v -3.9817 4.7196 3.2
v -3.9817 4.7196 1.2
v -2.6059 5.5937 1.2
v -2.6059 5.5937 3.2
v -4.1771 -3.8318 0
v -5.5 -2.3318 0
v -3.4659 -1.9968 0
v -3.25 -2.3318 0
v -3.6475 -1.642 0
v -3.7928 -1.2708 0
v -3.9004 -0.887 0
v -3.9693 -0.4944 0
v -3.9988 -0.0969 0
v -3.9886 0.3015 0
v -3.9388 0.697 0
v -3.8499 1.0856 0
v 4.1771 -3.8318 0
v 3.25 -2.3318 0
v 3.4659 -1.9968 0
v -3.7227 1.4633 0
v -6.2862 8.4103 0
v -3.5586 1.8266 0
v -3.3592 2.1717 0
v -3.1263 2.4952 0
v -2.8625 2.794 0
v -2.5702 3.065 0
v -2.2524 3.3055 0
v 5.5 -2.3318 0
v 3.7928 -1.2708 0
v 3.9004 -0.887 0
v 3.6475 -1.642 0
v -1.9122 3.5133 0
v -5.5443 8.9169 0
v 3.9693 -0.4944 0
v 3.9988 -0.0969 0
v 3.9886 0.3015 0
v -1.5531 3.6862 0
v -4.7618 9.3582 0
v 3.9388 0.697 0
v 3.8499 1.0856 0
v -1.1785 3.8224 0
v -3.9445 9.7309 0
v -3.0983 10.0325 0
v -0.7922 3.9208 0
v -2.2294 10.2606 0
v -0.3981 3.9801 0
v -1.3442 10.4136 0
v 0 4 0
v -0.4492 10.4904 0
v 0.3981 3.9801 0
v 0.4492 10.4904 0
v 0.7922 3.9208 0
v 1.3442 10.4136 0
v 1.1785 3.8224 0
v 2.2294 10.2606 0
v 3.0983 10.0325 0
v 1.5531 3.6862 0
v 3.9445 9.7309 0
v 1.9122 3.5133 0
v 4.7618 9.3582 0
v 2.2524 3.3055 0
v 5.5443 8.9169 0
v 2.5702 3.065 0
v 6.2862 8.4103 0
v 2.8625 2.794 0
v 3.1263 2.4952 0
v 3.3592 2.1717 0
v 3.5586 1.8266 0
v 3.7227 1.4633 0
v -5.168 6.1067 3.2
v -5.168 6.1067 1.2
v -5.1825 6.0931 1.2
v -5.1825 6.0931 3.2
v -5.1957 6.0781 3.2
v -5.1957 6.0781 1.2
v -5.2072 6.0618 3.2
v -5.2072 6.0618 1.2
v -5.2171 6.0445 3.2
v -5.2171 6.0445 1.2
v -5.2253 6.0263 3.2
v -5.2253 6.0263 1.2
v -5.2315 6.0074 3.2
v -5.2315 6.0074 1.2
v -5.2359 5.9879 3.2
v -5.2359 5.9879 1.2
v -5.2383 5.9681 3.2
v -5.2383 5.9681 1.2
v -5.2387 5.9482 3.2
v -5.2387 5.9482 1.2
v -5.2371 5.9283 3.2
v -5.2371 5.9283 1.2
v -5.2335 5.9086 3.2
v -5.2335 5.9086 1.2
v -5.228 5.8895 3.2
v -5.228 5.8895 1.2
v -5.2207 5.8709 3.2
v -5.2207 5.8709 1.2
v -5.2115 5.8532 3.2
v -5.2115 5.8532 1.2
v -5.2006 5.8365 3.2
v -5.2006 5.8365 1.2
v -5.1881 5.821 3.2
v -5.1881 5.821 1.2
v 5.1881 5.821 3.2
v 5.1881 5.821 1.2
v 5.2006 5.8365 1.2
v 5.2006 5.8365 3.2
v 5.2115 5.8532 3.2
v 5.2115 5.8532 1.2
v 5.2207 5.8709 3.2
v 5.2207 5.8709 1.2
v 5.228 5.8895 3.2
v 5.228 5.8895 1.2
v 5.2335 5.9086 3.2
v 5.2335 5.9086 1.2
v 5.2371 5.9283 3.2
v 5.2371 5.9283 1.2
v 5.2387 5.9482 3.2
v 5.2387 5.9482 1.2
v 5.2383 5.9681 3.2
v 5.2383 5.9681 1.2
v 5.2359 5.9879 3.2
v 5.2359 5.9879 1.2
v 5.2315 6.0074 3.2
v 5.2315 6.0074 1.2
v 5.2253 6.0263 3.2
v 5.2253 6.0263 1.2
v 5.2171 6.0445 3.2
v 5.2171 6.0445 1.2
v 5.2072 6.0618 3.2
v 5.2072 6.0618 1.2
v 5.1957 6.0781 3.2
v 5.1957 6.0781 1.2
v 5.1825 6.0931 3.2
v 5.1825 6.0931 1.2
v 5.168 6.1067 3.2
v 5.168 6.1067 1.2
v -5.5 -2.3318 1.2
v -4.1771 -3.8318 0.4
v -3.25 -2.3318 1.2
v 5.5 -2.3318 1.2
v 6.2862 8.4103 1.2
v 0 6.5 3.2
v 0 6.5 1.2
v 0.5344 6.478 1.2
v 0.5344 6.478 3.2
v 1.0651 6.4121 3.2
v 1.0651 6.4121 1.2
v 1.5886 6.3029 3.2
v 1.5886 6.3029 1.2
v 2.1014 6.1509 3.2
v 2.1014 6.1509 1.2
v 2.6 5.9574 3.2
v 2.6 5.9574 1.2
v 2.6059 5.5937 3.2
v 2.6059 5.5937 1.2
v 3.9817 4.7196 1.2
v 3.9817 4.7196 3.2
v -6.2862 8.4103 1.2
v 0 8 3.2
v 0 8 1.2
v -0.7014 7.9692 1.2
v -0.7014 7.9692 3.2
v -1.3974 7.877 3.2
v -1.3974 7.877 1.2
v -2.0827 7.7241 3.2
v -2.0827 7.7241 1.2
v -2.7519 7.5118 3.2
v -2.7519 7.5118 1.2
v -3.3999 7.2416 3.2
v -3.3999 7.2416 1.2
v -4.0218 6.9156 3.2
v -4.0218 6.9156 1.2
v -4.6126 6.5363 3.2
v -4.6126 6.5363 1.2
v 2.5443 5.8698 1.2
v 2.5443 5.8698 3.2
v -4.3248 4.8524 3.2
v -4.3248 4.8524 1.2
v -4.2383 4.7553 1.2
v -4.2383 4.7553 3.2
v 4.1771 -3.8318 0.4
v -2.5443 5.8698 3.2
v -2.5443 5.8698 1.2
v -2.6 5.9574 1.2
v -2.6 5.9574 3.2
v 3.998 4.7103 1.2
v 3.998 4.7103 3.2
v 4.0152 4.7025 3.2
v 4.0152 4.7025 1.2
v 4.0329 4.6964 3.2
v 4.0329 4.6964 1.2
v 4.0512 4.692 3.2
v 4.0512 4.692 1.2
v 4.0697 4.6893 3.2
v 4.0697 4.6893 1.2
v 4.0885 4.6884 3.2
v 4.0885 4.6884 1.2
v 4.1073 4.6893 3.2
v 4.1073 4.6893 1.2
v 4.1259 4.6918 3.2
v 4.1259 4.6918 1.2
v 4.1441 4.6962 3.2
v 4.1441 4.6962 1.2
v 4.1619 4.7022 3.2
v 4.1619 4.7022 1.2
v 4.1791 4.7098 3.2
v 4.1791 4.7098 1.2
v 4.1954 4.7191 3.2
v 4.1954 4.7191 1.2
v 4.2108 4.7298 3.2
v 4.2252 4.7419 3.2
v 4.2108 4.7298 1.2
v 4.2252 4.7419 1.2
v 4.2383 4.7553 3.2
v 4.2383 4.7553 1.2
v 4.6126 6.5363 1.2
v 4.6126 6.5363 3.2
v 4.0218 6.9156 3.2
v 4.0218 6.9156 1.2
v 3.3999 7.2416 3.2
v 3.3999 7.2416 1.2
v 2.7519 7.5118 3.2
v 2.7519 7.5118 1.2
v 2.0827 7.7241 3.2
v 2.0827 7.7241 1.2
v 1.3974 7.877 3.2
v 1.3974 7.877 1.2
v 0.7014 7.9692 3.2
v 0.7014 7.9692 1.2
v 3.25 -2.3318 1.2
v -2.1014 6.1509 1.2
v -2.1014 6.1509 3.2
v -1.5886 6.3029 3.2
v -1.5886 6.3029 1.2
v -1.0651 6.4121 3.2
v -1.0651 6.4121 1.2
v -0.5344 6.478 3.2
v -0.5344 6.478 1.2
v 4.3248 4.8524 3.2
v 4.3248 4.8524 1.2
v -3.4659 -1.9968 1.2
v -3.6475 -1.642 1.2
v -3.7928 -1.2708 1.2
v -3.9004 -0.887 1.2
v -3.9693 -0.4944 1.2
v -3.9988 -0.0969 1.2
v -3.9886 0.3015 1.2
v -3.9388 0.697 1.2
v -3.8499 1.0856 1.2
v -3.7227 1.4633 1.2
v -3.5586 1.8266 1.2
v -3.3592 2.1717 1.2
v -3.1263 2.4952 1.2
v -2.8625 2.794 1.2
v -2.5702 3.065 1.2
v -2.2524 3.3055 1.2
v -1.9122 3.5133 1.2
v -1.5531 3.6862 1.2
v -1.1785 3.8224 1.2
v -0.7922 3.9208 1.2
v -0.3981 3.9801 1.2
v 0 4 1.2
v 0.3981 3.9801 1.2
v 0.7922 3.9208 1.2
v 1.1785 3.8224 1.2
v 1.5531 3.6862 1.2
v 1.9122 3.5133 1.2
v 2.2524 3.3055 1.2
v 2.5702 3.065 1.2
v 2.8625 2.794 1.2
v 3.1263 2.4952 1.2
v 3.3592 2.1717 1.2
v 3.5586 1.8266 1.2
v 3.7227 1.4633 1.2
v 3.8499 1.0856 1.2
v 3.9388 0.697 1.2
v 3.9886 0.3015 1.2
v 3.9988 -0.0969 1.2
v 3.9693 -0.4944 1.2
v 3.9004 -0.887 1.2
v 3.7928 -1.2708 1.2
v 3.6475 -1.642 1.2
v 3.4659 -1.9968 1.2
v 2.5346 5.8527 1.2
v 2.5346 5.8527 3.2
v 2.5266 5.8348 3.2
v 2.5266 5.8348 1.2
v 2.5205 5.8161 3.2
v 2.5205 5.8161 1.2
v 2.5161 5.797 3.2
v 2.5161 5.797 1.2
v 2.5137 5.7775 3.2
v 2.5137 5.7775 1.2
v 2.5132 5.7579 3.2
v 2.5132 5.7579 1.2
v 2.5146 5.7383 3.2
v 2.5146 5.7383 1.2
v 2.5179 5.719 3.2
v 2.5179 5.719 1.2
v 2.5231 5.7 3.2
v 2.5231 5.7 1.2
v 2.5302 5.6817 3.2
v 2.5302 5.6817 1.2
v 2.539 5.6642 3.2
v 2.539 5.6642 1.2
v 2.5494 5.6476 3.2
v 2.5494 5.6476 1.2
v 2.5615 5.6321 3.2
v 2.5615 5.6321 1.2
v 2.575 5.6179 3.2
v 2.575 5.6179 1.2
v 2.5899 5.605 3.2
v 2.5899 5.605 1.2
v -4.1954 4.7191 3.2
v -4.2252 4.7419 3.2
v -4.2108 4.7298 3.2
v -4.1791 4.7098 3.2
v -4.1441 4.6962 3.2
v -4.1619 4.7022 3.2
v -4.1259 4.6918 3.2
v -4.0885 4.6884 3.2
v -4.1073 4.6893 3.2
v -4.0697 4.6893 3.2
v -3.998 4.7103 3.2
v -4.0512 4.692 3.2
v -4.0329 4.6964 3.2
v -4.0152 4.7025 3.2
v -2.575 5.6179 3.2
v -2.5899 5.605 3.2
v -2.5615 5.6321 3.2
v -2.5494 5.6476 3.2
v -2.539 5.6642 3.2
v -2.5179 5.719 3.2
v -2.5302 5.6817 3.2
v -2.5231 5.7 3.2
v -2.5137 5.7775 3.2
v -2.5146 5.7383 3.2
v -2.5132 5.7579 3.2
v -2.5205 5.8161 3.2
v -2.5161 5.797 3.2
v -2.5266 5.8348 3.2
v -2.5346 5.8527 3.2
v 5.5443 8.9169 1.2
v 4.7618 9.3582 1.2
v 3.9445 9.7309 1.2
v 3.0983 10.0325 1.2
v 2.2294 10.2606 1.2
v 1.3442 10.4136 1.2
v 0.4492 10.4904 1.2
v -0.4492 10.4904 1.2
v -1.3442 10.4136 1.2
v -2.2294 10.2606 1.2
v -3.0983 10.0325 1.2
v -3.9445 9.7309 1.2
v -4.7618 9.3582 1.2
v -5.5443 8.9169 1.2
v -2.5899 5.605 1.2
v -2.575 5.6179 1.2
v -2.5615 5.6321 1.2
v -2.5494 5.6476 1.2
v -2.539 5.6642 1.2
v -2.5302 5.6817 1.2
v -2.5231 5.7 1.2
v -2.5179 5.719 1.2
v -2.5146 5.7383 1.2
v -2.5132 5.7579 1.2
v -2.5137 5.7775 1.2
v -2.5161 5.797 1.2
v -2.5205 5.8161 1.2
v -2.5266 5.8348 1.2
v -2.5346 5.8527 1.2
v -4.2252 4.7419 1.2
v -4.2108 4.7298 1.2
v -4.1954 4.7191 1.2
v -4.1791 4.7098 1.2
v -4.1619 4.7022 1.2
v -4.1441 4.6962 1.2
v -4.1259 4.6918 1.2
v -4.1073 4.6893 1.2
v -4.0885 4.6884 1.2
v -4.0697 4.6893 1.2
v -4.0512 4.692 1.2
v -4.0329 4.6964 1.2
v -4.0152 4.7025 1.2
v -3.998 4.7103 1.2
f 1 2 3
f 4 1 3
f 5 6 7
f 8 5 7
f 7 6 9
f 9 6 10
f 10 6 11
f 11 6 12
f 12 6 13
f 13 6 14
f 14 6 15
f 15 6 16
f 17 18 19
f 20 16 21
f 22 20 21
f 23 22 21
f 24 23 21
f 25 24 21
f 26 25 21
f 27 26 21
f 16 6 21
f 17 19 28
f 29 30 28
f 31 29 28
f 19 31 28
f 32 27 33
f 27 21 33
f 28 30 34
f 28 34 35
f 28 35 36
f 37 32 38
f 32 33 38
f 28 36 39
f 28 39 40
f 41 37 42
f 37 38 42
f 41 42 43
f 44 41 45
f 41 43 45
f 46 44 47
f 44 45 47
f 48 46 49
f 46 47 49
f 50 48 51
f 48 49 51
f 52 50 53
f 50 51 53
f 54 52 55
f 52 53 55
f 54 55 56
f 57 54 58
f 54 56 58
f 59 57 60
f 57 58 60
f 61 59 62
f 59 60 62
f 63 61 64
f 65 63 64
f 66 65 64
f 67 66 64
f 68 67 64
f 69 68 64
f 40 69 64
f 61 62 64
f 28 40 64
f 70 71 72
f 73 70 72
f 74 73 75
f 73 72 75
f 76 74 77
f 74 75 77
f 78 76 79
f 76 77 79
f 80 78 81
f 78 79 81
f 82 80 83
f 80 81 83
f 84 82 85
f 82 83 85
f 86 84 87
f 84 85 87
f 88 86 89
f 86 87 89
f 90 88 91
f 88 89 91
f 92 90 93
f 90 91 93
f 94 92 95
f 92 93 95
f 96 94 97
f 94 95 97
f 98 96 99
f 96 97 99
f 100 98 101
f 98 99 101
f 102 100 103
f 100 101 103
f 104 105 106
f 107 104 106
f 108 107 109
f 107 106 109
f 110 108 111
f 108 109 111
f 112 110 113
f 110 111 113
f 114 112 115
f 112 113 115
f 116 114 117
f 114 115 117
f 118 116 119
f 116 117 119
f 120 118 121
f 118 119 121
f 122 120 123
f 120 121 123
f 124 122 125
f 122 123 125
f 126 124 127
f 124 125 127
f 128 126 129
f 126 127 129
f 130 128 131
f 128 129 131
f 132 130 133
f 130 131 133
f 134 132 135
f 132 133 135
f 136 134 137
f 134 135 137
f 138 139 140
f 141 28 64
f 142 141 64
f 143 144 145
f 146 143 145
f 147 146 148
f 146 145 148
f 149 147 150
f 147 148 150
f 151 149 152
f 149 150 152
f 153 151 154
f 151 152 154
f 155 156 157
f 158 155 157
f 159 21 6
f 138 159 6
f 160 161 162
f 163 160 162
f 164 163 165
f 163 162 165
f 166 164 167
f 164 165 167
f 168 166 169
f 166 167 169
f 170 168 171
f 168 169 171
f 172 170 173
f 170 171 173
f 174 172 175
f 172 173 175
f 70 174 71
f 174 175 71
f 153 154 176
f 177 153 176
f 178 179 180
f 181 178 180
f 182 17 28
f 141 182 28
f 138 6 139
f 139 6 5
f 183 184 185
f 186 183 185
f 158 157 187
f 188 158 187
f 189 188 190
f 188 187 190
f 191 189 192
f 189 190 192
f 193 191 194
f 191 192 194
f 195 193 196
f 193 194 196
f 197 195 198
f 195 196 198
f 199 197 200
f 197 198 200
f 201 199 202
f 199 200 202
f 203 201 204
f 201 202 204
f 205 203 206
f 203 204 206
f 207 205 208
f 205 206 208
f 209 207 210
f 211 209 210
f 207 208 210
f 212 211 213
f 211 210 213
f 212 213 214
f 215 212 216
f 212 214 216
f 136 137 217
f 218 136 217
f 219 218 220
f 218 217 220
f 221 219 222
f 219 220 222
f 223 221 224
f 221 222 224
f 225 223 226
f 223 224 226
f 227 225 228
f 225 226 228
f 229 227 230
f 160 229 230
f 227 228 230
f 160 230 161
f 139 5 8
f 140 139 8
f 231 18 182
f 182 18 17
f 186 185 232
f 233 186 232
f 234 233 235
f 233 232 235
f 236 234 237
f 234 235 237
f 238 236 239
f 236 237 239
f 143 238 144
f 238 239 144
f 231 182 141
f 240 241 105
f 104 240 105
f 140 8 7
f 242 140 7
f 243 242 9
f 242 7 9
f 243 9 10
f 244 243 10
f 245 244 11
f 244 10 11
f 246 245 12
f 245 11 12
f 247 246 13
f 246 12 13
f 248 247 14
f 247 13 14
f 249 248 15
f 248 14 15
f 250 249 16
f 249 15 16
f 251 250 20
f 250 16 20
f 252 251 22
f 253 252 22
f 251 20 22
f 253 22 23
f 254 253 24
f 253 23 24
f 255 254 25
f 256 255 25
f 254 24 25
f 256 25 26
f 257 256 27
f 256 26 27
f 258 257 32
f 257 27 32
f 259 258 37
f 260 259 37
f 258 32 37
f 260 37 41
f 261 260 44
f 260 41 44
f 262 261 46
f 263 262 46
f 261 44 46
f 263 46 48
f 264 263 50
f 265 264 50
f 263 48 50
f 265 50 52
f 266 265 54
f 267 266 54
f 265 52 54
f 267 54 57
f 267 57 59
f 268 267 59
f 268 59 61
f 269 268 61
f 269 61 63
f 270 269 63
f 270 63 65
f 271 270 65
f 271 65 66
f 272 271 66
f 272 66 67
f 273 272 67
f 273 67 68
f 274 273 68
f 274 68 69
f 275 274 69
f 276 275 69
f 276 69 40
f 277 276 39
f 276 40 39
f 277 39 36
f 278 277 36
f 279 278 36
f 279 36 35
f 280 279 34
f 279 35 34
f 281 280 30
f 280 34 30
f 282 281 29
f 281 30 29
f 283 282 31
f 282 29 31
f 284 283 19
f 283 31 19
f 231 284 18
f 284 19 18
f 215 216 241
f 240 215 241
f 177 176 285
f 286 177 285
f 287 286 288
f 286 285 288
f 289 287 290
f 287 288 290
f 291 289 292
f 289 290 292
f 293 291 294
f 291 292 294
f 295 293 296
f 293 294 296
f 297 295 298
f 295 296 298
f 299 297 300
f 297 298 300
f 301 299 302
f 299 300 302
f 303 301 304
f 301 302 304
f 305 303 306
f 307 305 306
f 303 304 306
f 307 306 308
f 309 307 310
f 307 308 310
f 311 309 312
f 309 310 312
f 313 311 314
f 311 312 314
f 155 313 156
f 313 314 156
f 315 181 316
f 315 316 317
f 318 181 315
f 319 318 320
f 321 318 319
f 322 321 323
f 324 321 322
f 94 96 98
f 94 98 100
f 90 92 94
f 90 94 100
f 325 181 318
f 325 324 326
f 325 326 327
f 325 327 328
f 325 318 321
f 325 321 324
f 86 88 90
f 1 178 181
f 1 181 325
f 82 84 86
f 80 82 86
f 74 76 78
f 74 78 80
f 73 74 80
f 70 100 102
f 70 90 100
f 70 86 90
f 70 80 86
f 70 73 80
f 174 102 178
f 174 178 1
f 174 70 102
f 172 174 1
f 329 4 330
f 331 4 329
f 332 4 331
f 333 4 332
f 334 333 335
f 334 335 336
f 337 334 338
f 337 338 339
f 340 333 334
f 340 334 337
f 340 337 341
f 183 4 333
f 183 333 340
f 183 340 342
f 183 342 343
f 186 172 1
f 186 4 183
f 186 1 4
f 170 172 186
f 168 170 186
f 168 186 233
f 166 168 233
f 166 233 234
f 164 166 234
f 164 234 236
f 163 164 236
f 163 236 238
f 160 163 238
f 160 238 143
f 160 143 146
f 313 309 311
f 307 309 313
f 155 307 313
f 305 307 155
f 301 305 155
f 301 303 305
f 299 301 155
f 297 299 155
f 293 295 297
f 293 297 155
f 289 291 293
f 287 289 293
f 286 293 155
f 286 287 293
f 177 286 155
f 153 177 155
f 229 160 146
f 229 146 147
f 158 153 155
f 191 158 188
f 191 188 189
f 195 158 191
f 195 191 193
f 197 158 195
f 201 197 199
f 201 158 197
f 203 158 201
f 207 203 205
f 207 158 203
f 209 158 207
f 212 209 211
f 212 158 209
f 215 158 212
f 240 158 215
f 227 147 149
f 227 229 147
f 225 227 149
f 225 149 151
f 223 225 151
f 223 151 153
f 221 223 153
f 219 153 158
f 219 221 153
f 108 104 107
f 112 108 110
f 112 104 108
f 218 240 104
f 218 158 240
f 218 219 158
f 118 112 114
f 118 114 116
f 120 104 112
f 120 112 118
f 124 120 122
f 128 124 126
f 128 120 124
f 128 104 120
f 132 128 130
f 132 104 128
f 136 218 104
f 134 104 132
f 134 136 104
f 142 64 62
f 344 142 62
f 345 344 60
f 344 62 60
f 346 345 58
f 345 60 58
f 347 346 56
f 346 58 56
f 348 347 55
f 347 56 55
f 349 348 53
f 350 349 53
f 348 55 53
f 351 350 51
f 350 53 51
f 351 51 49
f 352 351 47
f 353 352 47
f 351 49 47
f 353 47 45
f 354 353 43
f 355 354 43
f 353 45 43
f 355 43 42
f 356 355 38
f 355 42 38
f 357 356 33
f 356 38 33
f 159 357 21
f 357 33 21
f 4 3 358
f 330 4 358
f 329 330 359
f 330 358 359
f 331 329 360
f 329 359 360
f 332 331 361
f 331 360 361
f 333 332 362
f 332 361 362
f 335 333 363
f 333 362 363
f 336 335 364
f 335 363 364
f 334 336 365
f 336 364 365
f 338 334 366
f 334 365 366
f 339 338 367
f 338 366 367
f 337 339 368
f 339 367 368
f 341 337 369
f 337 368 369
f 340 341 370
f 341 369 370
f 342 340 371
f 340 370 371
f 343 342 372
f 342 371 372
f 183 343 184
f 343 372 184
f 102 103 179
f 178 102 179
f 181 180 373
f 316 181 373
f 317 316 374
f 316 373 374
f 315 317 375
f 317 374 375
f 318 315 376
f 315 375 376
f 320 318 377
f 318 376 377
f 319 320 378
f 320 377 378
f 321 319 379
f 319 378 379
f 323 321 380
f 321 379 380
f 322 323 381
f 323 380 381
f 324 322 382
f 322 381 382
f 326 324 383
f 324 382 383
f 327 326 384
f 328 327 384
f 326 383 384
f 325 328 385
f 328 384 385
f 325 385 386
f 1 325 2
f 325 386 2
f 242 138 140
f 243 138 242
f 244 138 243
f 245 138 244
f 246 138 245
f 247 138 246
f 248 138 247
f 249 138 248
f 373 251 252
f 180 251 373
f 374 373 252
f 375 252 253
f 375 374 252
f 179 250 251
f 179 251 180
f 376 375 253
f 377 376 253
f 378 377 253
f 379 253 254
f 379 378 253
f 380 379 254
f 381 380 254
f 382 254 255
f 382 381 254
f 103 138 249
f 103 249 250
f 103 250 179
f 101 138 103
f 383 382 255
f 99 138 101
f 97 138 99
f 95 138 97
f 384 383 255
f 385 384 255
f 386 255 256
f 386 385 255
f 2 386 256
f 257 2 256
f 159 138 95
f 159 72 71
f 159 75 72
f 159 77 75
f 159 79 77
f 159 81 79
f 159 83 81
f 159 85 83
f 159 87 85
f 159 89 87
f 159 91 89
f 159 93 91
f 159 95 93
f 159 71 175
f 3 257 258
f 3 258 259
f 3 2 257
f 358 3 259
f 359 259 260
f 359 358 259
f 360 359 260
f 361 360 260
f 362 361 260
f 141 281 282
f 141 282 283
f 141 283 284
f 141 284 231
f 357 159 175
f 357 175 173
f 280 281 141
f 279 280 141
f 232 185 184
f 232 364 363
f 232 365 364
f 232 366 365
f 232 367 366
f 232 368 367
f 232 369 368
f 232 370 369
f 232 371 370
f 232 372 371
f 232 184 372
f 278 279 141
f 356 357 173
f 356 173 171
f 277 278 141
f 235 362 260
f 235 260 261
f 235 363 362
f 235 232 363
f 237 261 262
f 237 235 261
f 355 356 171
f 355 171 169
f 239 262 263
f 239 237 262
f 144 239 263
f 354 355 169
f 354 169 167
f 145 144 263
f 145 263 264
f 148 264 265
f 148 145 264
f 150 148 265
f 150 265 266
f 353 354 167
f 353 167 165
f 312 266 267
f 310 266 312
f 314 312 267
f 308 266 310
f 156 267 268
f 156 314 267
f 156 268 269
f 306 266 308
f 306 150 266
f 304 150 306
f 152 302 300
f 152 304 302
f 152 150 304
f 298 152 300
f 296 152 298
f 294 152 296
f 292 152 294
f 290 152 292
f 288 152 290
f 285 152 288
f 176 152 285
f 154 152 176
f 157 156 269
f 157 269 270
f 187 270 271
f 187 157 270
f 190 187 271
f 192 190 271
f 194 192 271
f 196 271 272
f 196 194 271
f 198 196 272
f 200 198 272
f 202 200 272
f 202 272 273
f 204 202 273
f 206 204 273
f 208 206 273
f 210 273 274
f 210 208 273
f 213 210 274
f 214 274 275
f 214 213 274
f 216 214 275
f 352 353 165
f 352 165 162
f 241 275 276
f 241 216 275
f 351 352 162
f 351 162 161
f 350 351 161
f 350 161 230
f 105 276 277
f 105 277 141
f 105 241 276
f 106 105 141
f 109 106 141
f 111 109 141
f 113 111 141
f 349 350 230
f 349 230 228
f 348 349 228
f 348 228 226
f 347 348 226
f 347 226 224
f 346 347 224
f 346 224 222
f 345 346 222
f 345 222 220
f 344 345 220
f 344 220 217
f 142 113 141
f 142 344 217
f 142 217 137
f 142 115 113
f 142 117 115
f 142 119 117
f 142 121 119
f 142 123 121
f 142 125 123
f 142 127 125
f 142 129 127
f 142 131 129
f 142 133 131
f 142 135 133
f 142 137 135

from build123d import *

# Parameters (mm, degrees)
F1_DEPTH = 1.2
F3_DEPTH = 12.5
F5_DEPTH = 2


with BuildPart() as f1:
    # F0 (on Top) → F1 (new body)
    with BuildSketch(Plane.XY):
        with BuildLine():
            ThreePointArc((-3.25, -2.331845), (0, 4), (3.25, -2.331845))
            Line((3.25, -2.331845), (4.177124, -3.831845))
            Line((4.177124, -3.831845), (5.5, -2.331845))
            Line((5.5, -2.331845), (6.286185, 8.410343))
            ThreePointArc((6.286185, 8.410343), (0, 10.5), (-6.286185, 8.410343))
            Line((-6.286185, 8.410343), (-5.5, -2.331845))
            Line((-5.5, -2.331845), (-4.177124, -3.831845))
            Line((-4.177124, -3.831845), (-3.25, -2.331845))
        make_face()
    extrude(amount=F1_DEPTH)

    # F2 (on Right) → F3 (cut, symmetric)
    with BuildSketch(Plane.YZ):
        Polygon((-3.831845, 0.4), (-2.331845, 1.2), (-3.831845, 1.2), align=None)
    extrude(amount=F3_DEPTH, both=True, mode=Mode.SUBTRACT)

    # F4 (on face) → F5 (join)
    with BuildSketch(Plane.XY.offset(1.2)):
        with BuildLine():
            ThreePointArc((5.167966, 6.106728), (2.751924, 7.511785), (0, 8))
            ThreePointArc((0, 8), (-2.751924, 7.511785), (-5.167966, 6.106728))
            ThreePointArc((-5.167966, 6.106728), (-5.238273, 5.968098), (-5.188072, 5.820989))
            Line((-5.188072, 5.820989), (-4.324815, 4.852419))
            Line((-4.324815, 4.852419), (-4.238297, 4.755347))
            ThreePointArc((-4.238297, 4.755347), (-4.116589, 4.690331), (-3.981744, 4.719604))
            Line((-3.981744, 4.719604), (-2.605887, 5.593689))
            ThreePointArc((-2.605887, 5.593689), (-2.51793, 5.718968), (-2.544321, 5.86975))
            Line((-2.544321, 5.86975), (-2.599979, 5.957358))
            ThreePointArc((-2.599979, 5.957358), (-1.328001, 6.362893), (0, 6.5))
            ThreePointArc((0, 6.5), (1.328001, 6.362893), (2.599979, 5.957358))
            Line((2.599979, 5.957358), (2.544321, 5.86975))
            ThreePointArc((2.544321, 5.86975), (2.51793, 5.718968), (2.605887, 5.593689))
            Line((2.605887, 5.593689), (3.981744, 4.719604))
            ThreePointArc((3.981744, 4.719604), (4.116589, 4.690331), (4.238297, 4.755347))
            Line((4.238297, 4.755347), (4.324815, 4.852419))
            Line((4.324815, 4.852419), (5.188072, 5.820989))
            ThreePointArc((5.188072, 5.820989), (5.238273, 5.968098), (5.167966, 6.106728))
        make_face()
    extrude(amount=F5_DEPTH)


solid = f1.part
